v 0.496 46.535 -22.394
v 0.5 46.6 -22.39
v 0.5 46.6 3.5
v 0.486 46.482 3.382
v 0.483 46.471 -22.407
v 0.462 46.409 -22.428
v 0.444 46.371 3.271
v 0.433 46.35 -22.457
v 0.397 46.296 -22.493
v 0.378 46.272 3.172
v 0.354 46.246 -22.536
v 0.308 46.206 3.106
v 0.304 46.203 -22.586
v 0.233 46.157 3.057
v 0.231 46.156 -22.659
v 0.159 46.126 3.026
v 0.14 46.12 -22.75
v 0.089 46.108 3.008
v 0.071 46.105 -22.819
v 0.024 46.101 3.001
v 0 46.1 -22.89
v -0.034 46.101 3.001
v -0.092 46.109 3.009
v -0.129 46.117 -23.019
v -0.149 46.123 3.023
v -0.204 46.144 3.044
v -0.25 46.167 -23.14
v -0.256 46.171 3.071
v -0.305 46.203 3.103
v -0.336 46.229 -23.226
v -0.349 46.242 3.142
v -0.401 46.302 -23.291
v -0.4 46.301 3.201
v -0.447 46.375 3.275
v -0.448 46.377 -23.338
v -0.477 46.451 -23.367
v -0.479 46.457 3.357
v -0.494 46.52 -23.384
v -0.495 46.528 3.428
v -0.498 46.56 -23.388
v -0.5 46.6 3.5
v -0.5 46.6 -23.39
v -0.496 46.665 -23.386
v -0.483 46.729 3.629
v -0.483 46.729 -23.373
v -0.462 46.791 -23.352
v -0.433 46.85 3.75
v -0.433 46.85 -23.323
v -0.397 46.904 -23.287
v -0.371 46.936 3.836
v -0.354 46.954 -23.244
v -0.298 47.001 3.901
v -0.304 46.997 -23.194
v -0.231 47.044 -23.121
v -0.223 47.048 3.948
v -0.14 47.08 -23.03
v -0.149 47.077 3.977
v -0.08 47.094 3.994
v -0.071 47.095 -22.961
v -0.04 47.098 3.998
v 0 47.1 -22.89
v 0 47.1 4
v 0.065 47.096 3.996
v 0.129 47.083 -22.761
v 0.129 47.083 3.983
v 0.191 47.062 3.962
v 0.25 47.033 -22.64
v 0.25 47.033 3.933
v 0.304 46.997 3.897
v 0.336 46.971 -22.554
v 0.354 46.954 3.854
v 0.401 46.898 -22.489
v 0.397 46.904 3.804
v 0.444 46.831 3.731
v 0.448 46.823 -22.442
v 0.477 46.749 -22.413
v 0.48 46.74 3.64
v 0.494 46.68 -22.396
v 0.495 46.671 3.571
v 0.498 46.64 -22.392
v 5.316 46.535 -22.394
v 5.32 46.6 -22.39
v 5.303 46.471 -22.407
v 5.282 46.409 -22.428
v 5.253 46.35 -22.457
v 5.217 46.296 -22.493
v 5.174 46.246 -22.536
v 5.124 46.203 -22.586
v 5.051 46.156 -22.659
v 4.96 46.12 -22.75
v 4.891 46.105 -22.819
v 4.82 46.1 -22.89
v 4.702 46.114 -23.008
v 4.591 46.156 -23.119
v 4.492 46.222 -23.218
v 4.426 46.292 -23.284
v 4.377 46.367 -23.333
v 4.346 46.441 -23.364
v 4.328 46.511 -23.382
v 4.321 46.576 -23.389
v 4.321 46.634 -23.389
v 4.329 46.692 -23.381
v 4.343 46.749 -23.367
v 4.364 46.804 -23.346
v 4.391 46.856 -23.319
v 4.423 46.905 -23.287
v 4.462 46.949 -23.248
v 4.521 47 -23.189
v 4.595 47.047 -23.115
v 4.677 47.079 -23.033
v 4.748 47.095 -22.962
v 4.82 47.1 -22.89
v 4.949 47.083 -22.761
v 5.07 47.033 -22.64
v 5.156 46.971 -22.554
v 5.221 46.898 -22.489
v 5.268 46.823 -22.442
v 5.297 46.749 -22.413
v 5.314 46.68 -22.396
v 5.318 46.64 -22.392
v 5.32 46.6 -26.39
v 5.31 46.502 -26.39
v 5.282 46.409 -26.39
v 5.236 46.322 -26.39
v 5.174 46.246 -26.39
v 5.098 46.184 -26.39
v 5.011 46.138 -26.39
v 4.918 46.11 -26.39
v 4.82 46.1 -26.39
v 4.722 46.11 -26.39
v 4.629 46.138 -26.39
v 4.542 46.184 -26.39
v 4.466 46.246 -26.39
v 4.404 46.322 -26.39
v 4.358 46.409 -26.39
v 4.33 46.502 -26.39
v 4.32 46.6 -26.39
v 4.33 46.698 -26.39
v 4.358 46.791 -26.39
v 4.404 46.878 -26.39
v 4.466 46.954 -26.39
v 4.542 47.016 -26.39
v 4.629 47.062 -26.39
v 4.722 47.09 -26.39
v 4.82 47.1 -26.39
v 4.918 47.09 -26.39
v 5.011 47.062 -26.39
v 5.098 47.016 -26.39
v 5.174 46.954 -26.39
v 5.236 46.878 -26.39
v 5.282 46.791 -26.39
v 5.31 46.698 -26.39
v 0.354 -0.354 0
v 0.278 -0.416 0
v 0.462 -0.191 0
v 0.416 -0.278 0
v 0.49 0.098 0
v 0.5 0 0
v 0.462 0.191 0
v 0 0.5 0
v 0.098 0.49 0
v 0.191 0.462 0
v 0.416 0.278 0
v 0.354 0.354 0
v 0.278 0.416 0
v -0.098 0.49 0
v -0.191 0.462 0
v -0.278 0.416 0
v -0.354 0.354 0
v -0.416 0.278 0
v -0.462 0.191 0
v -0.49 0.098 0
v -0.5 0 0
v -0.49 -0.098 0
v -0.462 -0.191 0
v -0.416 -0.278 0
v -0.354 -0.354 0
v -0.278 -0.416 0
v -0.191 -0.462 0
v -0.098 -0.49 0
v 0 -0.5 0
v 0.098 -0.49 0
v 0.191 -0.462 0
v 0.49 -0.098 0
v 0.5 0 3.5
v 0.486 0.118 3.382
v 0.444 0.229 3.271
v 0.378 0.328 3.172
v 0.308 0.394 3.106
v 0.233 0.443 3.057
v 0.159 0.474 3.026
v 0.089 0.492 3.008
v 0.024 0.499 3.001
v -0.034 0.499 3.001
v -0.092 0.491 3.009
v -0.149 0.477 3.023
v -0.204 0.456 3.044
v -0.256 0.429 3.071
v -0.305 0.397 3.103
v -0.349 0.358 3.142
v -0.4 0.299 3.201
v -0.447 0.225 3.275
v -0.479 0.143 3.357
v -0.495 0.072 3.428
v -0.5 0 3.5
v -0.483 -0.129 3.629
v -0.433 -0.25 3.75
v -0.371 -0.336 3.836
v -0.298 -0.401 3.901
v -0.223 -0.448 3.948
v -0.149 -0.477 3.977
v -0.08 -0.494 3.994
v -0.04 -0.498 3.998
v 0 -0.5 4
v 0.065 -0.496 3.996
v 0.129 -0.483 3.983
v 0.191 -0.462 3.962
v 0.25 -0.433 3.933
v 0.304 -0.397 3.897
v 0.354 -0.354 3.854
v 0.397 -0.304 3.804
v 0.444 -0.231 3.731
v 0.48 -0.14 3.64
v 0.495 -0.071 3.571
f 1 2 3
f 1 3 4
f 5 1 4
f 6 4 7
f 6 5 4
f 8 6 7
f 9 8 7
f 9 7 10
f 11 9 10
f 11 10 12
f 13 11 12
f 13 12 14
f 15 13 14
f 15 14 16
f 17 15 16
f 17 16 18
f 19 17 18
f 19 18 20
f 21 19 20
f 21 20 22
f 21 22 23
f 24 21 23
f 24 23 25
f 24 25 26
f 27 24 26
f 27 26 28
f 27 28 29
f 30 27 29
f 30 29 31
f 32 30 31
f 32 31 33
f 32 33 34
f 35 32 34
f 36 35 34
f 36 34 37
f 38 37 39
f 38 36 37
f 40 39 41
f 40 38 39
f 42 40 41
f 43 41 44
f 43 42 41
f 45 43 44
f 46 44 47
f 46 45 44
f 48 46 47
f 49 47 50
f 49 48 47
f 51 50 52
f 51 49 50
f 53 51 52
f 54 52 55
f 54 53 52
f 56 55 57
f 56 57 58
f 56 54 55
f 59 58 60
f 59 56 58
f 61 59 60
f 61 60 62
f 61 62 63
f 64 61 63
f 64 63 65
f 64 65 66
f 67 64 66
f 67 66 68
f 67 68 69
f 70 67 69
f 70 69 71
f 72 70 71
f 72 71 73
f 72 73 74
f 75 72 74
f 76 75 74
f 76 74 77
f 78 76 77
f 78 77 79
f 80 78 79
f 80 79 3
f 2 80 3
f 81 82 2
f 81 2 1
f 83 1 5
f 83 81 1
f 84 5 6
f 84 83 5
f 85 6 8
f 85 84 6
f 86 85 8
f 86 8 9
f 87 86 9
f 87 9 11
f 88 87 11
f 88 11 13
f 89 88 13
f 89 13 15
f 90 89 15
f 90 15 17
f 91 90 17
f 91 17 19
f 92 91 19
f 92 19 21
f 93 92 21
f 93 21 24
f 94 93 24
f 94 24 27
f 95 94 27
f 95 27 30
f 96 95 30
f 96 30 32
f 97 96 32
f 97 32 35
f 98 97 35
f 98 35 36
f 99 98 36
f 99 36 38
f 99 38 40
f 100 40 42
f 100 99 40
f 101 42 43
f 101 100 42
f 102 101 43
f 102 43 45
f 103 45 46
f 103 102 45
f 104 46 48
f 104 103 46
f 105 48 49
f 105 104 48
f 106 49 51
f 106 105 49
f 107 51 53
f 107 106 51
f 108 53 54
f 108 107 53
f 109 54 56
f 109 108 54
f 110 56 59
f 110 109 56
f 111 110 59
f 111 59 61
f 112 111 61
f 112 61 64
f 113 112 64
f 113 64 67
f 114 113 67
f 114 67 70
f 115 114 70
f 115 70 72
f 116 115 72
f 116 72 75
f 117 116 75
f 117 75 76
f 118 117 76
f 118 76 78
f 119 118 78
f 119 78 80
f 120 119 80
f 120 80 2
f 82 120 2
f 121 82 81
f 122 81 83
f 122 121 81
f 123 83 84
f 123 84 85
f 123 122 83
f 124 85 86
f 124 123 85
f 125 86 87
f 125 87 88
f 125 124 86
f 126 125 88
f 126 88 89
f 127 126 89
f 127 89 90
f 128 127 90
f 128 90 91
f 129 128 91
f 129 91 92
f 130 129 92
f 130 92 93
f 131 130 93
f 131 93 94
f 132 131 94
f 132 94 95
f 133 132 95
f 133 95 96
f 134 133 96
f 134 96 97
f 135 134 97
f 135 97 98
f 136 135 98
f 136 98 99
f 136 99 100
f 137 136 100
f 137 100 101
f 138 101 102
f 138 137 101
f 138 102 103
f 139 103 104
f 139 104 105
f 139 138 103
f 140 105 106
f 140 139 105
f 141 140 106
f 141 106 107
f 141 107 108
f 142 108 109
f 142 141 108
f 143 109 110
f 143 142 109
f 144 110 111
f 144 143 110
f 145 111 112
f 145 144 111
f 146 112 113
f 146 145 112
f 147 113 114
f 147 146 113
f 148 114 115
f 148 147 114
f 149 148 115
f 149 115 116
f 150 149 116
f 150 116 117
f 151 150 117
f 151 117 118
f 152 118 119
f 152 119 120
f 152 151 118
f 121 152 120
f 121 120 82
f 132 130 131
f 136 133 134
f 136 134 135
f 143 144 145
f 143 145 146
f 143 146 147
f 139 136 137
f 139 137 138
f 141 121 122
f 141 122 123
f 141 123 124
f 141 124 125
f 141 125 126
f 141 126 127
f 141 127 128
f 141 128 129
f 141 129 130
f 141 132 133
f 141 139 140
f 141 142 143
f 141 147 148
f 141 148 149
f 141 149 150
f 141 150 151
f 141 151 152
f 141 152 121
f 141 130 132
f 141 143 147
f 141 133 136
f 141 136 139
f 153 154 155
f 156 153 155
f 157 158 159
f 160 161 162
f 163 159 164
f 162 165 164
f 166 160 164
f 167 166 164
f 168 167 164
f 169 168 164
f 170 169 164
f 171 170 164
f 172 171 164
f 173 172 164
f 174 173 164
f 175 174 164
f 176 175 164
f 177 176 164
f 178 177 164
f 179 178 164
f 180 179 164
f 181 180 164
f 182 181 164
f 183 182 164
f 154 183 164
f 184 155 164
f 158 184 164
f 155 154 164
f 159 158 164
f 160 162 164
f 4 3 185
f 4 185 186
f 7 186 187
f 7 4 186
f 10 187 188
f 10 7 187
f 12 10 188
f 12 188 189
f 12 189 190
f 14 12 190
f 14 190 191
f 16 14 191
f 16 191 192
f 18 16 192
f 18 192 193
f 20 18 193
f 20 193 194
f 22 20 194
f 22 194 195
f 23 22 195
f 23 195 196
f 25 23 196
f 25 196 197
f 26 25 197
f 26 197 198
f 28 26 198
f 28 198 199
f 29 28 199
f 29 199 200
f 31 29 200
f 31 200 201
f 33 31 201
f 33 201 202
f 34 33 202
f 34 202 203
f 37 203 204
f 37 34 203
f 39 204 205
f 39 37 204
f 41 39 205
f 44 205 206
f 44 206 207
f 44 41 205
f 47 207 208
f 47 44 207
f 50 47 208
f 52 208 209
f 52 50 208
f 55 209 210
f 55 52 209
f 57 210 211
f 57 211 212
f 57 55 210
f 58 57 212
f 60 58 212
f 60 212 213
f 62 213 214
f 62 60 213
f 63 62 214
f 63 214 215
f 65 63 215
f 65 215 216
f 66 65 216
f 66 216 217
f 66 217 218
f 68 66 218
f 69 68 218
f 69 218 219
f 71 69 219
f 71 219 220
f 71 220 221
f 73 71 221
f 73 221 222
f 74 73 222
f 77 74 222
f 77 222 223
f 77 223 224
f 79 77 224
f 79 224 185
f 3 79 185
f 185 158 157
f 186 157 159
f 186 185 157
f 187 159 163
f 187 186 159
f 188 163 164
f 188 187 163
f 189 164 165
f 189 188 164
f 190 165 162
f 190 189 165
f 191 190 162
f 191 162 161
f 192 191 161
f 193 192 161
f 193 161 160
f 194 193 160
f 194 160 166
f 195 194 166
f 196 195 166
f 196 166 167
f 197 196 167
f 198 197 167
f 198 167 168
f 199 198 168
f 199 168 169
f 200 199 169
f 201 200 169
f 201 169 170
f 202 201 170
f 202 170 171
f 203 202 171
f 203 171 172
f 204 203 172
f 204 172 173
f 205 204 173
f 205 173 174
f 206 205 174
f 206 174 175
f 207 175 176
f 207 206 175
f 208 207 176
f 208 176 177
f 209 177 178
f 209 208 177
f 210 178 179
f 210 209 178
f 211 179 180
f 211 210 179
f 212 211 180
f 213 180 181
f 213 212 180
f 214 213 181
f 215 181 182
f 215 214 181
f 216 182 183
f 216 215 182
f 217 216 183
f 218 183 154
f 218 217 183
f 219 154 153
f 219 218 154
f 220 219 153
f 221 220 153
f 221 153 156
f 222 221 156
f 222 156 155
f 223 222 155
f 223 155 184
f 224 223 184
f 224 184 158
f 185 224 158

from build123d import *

# Parameters (mm, degrees)
ESQUISSE2_R = 0.5


with BuildPart() as part:
    # Balayage2: sweep along a curve in space
    with BuildLine() as balayage2_path:
        Line((0, 0, 0), (0, 0, 3.5))
        Line((0, 0, 3.5), (0, 46.6, 3.5))
        Line((0, 46.6, 3.5), (0, 46.6, -22.89))
        Line((0, 46.6, -22.89), (4.82, 46.6, -22.89))
        Line((4.82, 46.6, -22.89), (4.82, 46.6, -26.39))
    # Esquisse2 → Balayage2 (sweep)
    with BuildSketch(Plane.XY):
        Circle(ESQUISSE2_R)
    sweep(path=balayage2_path.line, transition=Transition.RIGHT)


solid = part.part
